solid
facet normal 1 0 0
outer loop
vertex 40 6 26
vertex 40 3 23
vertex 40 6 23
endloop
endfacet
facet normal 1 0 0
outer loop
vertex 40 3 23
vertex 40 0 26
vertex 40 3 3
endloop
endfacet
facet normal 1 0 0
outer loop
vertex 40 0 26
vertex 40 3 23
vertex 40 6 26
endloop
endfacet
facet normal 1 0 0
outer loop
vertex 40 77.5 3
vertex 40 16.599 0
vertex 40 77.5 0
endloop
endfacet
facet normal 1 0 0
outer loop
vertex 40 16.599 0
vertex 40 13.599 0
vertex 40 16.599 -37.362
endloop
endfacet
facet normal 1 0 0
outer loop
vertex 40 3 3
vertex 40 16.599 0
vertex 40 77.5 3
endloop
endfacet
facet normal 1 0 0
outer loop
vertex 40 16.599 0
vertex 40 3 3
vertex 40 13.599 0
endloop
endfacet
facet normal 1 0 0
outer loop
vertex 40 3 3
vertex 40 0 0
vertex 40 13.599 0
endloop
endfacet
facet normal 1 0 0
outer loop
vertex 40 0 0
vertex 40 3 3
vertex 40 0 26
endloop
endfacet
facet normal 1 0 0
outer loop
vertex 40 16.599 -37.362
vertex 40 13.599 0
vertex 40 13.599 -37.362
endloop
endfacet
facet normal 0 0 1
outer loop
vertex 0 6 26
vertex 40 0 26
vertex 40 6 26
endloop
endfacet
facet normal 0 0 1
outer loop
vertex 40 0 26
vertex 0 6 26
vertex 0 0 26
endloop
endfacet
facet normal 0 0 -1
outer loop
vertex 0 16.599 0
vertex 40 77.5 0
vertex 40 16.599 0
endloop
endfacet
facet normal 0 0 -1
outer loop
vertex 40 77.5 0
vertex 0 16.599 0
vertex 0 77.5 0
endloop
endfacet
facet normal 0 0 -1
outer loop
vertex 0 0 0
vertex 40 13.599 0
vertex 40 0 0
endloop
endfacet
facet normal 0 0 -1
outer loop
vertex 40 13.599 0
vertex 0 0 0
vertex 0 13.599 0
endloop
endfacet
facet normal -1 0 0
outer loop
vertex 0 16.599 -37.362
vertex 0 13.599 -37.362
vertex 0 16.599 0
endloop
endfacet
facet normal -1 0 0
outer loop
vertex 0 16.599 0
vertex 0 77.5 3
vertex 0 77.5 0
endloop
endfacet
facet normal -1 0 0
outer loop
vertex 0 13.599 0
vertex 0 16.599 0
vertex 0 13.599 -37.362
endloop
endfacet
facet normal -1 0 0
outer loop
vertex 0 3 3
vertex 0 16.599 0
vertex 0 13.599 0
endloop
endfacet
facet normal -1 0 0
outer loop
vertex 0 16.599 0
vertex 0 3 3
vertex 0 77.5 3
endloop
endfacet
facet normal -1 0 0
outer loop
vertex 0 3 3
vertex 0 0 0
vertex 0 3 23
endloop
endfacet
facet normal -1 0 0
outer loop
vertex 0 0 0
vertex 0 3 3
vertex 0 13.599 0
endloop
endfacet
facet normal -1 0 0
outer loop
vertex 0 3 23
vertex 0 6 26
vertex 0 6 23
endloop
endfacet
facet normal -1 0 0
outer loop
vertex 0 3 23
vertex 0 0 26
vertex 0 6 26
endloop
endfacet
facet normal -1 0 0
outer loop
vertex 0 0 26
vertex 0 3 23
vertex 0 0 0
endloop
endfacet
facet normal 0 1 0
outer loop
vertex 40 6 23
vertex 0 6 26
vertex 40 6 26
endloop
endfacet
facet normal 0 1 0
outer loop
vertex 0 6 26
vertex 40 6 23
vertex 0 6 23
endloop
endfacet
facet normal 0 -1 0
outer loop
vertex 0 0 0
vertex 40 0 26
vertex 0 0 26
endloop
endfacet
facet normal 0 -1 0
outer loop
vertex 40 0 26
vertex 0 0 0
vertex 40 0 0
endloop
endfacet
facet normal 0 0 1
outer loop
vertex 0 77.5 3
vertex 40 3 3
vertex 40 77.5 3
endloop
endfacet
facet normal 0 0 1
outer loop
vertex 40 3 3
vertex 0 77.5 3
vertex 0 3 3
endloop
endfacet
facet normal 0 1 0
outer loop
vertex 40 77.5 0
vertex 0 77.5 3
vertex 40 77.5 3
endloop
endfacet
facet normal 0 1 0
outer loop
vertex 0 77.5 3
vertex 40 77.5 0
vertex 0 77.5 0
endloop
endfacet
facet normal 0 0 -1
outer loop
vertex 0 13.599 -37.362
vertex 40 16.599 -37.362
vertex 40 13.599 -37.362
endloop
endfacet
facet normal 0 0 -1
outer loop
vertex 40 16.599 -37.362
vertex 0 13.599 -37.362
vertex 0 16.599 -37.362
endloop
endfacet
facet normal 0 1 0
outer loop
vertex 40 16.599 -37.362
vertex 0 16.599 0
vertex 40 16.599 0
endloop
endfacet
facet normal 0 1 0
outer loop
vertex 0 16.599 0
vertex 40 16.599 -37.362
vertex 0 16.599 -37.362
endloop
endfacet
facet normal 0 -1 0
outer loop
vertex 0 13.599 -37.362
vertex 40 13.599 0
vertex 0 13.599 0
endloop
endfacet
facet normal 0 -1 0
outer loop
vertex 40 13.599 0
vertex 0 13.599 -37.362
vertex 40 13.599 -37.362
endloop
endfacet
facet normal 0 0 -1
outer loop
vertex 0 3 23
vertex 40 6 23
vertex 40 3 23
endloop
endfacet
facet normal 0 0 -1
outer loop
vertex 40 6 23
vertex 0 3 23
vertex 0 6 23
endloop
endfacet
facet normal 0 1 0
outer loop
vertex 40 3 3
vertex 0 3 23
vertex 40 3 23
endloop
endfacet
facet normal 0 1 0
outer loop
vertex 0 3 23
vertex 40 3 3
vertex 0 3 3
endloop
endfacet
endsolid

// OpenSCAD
tablet_x = 80; 
tablet_y = 155;
tablet_z = 20;
tablet_bottom = 6;

make_stand(angle =70, thickness = 3, centre_mass= 3/4);


module tablet(){
    cube([tablet_x,tablet_y, tablet_z]);
}

module stand_bottom(thickness = 3){
    //translate([tablet_x/4,0,0])
     union(){
        cube([tablet_x/2,tablet_bottom, tablet_z+(thickness*2)]);
     cube([tablet_x/2,tablet_y/2, thickness]);
    }   
}

module make_stand( angle = 70, thickness = 3, centre_mass= 3/4){
    bottom_length = tablet_y*(centre_mass)*cos(angle);
    support_length = bottom_length*sin(angle);
    support_height = bottom_length*cos(angle);
    difference(){
        union(){
            stand_bottom(thickness);
            translate([0,support_height,-support_length])
            cube([tablet_x/2,thickness,support_length]);
        }
        translate([0, 3, 3]) tablet();
    };
};
